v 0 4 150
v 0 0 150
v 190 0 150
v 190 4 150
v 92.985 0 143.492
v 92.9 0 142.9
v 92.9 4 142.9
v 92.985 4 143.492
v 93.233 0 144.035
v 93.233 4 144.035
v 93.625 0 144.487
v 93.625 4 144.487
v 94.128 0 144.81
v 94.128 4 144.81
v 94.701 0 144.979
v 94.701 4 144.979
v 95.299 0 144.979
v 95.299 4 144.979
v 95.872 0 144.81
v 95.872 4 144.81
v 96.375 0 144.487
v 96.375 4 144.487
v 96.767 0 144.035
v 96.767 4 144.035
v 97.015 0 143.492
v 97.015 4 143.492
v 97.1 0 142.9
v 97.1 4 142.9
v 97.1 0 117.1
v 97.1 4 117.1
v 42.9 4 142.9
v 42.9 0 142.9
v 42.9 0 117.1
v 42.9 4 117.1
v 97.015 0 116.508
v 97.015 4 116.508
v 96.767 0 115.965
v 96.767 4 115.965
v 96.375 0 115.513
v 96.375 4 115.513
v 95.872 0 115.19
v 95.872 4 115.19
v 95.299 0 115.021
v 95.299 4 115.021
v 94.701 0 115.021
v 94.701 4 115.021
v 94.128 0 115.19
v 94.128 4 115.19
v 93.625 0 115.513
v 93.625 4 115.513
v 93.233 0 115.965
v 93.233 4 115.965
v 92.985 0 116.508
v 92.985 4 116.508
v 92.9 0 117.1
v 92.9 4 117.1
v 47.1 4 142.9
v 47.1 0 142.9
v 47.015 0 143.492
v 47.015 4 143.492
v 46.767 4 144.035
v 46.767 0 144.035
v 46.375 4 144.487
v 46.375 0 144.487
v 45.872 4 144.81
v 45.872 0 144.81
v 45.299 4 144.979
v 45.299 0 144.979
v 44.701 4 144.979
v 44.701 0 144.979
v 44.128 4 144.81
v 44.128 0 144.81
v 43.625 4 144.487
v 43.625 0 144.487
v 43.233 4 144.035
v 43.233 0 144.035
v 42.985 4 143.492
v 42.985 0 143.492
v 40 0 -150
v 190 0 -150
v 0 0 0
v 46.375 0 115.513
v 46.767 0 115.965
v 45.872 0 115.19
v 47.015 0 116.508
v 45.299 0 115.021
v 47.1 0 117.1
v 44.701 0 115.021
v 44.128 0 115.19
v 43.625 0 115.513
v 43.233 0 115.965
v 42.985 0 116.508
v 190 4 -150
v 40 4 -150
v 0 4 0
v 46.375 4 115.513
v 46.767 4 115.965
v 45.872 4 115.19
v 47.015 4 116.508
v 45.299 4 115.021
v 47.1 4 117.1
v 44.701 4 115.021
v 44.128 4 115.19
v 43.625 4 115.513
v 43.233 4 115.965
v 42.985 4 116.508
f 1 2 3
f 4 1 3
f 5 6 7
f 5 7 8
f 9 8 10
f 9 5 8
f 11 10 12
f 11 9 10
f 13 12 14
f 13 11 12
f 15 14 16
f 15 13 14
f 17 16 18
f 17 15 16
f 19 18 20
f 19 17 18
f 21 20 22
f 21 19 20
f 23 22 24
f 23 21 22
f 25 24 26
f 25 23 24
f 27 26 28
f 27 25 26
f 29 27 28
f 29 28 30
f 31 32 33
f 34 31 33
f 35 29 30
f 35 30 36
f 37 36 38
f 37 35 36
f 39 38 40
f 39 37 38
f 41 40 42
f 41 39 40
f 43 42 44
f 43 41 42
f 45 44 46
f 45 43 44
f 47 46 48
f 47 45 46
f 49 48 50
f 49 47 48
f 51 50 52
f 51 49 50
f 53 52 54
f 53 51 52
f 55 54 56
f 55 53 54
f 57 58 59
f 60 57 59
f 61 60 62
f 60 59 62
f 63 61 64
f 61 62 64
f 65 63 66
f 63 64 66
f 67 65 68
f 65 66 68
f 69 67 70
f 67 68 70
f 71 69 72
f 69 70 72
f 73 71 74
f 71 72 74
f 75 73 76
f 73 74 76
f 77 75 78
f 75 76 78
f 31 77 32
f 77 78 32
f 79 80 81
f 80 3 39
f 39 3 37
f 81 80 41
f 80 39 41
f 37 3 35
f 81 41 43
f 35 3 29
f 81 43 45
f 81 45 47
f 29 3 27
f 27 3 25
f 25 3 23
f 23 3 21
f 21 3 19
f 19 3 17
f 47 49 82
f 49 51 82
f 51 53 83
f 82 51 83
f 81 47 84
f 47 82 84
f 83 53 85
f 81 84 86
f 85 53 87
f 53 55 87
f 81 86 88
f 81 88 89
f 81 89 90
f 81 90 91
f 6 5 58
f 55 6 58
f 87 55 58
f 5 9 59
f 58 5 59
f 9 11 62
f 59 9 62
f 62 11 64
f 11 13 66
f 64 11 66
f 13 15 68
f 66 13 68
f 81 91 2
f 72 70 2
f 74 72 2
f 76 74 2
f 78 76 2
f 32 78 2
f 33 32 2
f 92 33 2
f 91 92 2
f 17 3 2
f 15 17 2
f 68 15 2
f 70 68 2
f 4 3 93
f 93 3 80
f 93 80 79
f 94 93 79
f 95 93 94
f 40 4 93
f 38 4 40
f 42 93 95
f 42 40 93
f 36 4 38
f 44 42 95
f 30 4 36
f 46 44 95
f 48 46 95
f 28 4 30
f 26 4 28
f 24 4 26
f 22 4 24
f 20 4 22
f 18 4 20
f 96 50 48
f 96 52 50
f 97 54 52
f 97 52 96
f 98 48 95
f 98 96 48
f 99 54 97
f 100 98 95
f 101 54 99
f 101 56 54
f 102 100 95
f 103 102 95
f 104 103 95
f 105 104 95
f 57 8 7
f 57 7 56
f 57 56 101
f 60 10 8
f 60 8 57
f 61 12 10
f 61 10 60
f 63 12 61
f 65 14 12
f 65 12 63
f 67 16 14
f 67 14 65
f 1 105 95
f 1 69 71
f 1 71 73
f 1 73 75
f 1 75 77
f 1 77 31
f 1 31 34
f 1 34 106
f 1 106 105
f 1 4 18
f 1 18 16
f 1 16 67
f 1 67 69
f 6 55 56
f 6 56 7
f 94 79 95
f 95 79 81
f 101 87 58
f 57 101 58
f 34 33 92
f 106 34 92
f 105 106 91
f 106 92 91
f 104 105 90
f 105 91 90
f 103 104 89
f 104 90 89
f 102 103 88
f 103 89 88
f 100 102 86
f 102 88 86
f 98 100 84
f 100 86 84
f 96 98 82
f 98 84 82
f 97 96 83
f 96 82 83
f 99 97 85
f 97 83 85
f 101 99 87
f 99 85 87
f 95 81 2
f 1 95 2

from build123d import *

# Parameters (mm, degrees)
BOSS_EXTRUDE1_DEPTH = 4


with BuildPart() as part:
    # Sketch1 → Boss-Extrude1 (new body)
    with BuildSketch(Plane(origin=(0, 0, 0), x_dir=(-1, 0, 0), z_dir=(0, 1, 0))):
        Polygon((0, 0), (0, 150), (-190, 150), (-190, -150), (-40, -150), align=None)
        with BuildLine():
            Line((-97.1, 142.9), (-97.1, 117.1))
            ThreePointArc((-97.1, 117.1), (-95, 115), (-92.9, 117.1))
            Line((-92.9, 117.1), (-92.9, 142.9))
            ThreePointArc((-92.9, 142.9), (-95, 145), (-97.1, 142.9))
        make_face(mode=Mode.SUBTRACT)
        with BuildLine():
            Line((-42.9, 142.9), (-42.9, 117.1))
            ThreePointArc((-42.9, 117.1), (-45, 115), (-47.1, 117.1))
            Line((-47.1, 117.1), (-47.1, 142.9))
            ThreePointArc((-47.1, 142.9), (-45, 145), (-42.9, 142.9))
        make_face(mode=Mode.SUBTRACT)
    extrude(amount=BOSS_EXTRUDE1_DEPTH)


solid = part.part
